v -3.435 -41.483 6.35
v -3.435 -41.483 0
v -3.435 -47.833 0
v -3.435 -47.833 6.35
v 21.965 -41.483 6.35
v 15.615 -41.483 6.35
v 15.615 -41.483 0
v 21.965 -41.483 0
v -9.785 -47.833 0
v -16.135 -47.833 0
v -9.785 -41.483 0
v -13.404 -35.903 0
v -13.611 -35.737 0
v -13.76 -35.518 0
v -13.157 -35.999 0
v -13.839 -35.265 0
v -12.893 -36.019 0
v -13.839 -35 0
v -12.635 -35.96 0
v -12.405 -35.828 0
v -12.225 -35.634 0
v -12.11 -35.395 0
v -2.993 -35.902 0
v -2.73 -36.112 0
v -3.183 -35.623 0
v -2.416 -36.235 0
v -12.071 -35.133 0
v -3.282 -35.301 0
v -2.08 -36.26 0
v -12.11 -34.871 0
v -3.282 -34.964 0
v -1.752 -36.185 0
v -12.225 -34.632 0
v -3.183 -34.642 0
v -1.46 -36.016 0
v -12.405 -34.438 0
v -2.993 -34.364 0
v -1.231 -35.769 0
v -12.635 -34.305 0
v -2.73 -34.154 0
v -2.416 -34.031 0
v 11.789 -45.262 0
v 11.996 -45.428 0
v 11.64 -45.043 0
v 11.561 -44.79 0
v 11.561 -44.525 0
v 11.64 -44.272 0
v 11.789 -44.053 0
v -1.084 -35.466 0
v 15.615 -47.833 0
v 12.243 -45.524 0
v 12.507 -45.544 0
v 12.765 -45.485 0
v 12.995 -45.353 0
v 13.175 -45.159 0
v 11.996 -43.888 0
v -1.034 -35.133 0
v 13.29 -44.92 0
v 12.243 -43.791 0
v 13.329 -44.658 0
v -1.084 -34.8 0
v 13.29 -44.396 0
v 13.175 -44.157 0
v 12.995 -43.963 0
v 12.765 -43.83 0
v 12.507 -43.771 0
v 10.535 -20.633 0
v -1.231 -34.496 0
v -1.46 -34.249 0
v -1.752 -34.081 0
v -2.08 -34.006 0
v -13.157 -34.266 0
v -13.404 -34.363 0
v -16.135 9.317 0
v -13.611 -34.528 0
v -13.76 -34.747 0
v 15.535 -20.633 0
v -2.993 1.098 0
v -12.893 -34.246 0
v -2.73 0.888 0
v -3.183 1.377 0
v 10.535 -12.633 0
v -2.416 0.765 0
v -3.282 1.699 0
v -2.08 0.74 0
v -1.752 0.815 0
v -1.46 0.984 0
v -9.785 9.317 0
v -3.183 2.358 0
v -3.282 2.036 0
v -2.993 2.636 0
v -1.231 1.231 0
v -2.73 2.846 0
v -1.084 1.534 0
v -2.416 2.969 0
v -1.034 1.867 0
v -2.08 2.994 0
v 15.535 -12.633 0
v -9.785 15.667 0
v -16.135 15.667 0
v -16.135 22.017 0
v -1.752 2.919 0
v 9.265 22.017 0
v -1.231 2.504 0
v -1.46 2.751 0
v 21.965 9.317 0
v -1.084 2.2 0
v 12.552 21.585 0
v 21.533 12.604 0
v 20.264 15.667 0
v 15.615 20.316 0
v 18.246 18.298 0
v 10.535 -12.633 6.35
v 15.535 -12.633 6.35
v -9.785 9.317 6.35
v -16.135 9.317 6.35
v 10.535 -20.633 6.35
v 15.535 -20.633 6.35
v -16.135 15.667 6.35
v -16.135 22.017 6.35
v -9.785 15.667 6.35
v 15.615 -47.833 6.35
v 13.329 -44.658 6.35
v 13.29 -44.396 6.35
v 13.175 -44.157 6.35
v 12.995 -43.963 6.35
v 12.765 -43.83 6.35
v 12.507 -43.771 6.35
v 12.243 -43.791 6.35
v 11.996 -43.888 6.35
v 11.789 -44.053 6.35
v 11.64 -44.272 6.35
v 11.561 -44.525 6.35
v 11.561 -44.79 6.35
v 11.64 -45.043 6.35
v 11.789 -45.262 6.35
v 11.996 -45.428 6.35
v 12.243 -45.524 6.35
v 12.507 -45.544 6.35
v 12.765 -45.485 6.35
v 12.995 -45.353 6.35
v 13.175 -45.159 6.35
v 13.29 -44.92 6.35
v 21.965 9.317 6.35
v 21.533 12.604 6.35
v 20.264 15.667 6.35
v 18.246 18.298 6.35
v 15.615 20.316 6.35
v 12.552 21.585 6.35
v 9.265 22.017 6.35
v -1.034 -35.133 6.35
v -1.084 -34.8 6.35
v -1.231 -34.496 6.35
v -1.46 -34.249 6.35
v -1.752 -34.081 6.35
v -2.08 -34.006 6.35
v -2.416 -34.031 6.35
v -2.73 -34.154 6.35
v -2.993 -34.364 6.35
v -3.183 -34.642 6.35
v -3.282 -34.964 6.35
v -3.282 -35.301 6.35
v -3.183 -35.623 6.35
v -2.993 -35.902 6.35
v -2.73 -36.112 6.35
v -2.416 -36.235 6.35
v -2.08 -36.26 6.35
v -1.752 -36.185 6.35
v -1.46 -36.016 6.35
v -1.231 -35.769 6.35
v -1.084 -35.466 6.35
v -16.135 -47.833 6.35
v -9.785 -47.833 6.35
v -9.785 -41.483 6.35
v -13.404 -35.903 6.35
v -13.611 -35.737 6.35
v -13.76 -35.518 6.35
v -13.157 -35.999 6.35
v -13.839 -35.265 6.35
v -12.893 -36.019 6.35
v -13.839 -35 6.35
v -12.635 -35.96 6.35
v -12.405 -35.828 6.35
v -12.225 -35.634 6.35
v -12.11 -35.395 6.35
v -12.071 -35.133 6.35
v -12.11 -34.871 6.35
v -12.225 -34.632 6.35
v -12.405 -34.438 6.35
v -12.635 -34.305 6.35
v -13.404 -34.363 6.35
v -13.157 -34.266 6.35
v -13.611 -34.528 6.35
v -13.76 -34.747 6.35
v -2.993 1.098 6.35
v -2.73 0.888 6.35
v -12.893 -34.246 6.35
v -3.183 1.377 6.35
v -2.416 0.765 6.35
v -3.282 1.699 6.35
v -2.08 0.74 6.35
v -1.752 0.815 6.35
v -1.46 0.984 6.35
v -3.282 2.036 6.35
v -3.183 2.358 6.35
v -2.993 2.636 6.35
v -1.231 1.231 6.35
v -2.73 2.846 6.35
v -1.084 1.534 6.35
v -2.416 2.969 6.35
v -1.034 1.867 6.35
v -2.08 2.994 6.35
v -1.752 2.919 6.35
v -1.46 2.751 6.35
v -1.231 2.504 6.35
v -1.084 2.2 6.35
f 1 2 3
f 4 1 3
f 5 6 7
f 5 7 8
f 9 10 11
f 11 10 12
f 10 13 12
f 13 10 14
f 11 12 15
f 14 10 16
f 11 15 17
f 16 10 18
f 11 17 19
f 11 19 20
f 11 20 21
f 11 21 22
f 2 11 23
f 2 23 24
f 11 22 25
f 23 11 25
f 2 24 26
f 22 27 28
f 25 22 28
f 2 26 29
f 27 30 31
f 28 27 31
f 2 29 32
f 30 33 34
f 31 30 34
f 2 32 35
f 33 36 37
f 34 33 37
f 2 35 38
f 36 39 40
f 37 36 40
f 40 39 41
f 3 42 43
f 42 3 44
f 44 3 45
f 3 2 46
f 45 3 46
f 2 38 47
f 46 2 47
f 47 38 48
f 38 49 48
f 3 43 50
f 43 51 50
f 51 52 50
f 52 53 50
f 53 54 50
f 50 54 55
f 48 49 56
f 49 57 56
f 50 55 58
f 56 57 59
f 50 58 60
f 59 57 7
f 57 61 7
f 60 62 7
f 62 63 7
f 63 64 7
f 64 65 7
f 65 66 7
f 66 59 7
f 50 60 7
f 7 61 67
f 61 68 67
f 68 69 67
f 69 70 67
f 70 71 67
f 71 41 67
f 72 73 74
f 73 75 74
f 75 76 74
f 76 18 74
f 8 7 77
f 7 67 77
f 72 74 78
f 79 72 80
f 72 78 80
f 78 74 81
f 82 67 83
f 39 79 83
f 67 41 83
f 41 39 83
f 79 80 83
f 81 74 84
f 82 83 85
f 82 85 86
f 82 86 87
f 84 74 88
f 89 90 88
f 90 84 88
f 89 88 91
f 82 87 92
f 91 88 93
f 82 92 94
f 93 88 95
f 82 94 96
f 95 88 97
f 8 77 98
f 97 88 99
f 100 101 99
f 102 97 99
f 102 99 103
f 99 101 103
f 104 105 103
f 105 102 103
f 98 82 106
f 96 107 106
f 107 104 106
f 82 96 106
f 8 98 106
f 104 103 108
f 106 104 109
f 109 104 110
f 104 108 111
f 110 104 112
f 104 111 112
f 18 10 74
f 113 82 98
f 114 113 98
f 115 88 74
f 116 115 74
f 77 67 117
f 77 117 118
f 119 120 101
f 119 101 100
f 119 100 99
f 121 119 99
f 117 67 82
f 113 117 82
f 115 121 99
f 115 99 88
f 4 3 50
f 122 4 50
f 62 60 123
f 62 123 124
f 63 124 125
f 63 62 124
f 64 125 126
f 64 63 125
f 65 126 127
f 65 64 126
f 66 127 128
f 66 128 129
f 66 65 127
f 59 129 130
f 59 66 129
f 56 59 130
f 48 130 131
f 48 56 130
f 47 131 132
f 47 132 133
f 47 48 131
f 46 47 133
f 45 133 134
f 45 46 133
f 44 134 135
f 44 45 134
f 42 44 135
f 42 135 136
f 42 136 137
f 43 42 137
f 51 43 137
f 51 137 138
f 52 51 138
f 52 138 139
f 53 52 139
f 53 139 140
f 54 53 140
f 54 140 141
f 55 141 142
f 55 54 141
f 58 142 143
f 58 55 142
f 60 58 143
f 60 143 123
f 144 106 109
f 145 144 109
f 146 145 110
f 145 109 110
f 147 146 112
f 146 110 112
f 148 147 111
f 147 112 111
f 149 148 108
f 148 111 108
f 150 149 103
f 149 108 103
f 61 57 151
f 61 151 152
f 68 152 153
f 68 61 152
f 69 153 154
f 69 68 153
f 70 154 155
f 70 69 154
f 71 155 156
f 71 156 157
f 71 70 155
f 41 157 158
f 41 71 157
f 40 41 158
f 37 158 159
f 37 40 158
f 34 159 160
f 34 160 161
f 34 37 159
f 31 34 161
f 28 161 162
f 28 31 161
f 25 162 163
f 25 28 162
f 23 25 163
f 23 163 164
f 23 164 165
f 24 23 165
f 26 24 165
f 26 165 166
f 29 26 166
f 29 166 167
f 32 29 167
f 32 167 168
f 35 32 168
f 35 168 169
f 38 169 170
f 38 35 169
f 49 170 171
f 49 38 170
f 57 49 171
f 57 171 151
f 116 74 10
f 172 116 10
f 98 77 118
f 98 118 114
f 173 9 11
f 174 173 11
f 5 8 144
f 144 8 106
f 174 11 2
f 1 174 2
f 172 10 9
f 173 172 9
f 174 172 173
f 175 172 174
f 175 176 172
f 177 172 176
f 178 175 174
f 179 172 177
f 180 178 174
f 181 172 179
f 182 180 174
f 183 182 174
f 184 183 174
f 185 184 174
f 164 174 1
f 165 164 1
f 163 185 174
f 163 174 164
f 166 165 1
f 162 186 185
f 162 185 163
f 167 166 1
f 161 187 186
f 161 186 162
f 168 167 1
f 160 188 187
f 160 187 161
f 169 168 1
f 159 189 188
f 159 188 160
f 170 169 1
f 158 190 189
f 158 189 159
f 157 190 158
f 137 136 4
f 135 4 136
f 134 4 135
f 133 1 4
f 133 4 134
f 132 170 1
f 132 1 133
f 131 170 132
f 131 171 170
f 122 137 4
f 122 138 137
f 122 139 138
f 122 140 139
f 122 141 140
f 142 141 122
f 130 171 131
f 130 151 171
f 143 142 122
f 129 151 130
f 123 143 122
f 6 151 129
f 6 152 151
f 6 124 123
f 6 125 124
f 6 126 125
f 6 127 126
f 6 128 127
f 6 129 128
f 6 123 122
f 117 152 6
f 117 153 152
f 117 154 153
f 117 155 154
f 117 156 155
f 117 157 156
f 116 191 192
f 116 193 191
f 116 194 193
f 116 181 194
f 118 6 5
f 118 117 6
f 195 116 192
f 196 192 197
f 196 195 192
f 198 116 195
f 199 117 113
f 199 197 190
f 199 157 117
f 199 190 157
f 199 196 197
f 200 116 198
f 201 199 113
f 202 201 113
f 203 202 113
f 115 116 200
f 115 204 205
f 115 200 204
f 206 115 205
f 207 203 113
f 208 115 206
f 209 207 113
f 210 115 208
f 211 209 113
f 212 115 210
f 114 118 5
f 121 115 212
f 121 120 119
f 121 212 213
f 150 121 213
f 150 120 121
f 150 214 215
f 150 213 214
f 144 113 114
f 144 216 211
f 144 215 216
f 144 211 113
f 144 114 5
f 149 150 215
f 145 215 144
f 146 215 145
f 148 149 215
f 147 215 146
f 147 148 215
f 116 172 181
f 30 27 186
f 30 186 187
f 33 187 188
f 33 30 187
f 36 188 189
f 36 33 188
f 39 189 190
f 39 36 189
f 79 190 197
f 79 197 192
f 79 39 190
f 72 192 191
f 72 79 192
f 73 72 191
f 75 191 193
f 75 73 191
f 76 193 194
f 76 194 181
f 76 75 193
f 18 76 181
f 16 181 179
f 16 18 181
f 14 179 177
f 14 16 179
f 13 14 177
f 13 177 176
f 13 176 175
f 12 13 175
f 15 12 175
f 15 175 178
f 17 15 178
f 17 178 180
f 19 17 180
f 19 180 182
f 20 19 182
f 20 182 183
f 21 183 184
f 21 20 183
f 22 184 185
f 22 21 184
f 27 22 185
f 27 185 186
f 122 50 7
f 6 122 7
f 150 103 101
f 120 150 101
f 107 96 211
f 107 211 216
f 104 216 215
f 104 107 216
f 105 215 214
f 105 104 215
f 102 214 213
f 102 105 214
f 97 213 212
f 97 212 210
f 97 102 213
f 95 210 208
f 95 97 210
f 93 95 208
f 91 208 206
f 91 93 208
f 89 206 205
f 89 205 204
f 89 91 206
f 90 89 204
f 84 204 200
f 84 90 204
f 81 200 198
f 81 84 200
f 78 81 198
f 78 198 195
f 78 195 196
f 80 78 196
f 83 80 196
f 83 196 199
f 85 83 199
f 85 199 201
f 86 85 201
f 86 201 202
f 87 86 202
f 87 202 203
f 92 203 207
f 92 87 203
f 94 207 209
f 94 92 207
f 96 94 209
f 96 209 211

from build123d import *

# Parameters (mm, degrees)
SKETCH1_R           = 1.1303
SKETCH1_R_2         = 0.889
SKETCH1_W           = 5
SKETCH1_H           = 8.000000002
BOSS_EXTRUDE1_DEPTH = 6.35


with BuildPart() as part:
    # Sketch1 → Boss-Extrude1 (new body)
    with BuildSketch(Plane.XY):
        with BuildLine():
            Line((-16.134535362, 9.317270845), (-16.134535362, -47.832729155))
            Line((-16.134535362, -47.832729155), (-9.784535362, -47.832729155))
            Line((-9.784535362, -47.832729155), (-9.784535362, -41.482729155))
            Line((-9.784535362, -41.482729155), (-3.434535362, -41.482729155))
            Line((-3.434535362, -41.482729155), (-3.434535362, -47.832729155))
            Line((-3.434535362, -47.832729155), (15.615464638, -47.832729155))
            Line((15.615464638, -47.832729155), (15.615464638, -41.482729155))
            Line((15.615464638, -41.482729155), (21.965464638, -41.482729155))
            Line((21.965464638, -41.482729155), (21.965464638, 9.317270845))
            ThreePointArc((21.965464638, 9.317270845), (18.245720759, 18.297526966), (9.265464638, 22.017270845))
            Line((9.265464638, 22.017270845), (-16.134535362, 22.017270845))
            Line((-16.134535362, 22.017270845), (-16.134535362, 15.667270845))
            Line((-16.134535362, 15.667270845), (-9.784535362, 15.667270845))
            Line((-9.784535362, 15.667270845), (-9.784535362, 9.317270845))
            Line((-9.784535362, 9.317270845), (-16.134535362, 9.317270845))
        make_face()
        with Locations((-2.164535362, -35.132729155)):
            Circle(SKETCH1_R, mode=Mode.SUBTRACT)
        with Locations((-2.164535362, 1.867270845)):
            Circle(SKETCH1_R, mode=Mode.SUBTRACT)
        with Locations((12.440464638, -44.657729155)):
            Circle(SKETCH1_R_2, mode=Mode.SUBTRACT)
        with Locations((-12.959535362, -35.132729155)):
            Circle(SKETCH1_R_2, mode=Mode.SUBTRACT)
        with Locations((13.035464638, -16.63272908)):
            Rectangle(SKETCH1_W, SKETCH1_H, mode=Mode.SUBTRACT)
    extrude(amount=BOSS_EXTRUDE1_DEPTH)


solid = part.part
